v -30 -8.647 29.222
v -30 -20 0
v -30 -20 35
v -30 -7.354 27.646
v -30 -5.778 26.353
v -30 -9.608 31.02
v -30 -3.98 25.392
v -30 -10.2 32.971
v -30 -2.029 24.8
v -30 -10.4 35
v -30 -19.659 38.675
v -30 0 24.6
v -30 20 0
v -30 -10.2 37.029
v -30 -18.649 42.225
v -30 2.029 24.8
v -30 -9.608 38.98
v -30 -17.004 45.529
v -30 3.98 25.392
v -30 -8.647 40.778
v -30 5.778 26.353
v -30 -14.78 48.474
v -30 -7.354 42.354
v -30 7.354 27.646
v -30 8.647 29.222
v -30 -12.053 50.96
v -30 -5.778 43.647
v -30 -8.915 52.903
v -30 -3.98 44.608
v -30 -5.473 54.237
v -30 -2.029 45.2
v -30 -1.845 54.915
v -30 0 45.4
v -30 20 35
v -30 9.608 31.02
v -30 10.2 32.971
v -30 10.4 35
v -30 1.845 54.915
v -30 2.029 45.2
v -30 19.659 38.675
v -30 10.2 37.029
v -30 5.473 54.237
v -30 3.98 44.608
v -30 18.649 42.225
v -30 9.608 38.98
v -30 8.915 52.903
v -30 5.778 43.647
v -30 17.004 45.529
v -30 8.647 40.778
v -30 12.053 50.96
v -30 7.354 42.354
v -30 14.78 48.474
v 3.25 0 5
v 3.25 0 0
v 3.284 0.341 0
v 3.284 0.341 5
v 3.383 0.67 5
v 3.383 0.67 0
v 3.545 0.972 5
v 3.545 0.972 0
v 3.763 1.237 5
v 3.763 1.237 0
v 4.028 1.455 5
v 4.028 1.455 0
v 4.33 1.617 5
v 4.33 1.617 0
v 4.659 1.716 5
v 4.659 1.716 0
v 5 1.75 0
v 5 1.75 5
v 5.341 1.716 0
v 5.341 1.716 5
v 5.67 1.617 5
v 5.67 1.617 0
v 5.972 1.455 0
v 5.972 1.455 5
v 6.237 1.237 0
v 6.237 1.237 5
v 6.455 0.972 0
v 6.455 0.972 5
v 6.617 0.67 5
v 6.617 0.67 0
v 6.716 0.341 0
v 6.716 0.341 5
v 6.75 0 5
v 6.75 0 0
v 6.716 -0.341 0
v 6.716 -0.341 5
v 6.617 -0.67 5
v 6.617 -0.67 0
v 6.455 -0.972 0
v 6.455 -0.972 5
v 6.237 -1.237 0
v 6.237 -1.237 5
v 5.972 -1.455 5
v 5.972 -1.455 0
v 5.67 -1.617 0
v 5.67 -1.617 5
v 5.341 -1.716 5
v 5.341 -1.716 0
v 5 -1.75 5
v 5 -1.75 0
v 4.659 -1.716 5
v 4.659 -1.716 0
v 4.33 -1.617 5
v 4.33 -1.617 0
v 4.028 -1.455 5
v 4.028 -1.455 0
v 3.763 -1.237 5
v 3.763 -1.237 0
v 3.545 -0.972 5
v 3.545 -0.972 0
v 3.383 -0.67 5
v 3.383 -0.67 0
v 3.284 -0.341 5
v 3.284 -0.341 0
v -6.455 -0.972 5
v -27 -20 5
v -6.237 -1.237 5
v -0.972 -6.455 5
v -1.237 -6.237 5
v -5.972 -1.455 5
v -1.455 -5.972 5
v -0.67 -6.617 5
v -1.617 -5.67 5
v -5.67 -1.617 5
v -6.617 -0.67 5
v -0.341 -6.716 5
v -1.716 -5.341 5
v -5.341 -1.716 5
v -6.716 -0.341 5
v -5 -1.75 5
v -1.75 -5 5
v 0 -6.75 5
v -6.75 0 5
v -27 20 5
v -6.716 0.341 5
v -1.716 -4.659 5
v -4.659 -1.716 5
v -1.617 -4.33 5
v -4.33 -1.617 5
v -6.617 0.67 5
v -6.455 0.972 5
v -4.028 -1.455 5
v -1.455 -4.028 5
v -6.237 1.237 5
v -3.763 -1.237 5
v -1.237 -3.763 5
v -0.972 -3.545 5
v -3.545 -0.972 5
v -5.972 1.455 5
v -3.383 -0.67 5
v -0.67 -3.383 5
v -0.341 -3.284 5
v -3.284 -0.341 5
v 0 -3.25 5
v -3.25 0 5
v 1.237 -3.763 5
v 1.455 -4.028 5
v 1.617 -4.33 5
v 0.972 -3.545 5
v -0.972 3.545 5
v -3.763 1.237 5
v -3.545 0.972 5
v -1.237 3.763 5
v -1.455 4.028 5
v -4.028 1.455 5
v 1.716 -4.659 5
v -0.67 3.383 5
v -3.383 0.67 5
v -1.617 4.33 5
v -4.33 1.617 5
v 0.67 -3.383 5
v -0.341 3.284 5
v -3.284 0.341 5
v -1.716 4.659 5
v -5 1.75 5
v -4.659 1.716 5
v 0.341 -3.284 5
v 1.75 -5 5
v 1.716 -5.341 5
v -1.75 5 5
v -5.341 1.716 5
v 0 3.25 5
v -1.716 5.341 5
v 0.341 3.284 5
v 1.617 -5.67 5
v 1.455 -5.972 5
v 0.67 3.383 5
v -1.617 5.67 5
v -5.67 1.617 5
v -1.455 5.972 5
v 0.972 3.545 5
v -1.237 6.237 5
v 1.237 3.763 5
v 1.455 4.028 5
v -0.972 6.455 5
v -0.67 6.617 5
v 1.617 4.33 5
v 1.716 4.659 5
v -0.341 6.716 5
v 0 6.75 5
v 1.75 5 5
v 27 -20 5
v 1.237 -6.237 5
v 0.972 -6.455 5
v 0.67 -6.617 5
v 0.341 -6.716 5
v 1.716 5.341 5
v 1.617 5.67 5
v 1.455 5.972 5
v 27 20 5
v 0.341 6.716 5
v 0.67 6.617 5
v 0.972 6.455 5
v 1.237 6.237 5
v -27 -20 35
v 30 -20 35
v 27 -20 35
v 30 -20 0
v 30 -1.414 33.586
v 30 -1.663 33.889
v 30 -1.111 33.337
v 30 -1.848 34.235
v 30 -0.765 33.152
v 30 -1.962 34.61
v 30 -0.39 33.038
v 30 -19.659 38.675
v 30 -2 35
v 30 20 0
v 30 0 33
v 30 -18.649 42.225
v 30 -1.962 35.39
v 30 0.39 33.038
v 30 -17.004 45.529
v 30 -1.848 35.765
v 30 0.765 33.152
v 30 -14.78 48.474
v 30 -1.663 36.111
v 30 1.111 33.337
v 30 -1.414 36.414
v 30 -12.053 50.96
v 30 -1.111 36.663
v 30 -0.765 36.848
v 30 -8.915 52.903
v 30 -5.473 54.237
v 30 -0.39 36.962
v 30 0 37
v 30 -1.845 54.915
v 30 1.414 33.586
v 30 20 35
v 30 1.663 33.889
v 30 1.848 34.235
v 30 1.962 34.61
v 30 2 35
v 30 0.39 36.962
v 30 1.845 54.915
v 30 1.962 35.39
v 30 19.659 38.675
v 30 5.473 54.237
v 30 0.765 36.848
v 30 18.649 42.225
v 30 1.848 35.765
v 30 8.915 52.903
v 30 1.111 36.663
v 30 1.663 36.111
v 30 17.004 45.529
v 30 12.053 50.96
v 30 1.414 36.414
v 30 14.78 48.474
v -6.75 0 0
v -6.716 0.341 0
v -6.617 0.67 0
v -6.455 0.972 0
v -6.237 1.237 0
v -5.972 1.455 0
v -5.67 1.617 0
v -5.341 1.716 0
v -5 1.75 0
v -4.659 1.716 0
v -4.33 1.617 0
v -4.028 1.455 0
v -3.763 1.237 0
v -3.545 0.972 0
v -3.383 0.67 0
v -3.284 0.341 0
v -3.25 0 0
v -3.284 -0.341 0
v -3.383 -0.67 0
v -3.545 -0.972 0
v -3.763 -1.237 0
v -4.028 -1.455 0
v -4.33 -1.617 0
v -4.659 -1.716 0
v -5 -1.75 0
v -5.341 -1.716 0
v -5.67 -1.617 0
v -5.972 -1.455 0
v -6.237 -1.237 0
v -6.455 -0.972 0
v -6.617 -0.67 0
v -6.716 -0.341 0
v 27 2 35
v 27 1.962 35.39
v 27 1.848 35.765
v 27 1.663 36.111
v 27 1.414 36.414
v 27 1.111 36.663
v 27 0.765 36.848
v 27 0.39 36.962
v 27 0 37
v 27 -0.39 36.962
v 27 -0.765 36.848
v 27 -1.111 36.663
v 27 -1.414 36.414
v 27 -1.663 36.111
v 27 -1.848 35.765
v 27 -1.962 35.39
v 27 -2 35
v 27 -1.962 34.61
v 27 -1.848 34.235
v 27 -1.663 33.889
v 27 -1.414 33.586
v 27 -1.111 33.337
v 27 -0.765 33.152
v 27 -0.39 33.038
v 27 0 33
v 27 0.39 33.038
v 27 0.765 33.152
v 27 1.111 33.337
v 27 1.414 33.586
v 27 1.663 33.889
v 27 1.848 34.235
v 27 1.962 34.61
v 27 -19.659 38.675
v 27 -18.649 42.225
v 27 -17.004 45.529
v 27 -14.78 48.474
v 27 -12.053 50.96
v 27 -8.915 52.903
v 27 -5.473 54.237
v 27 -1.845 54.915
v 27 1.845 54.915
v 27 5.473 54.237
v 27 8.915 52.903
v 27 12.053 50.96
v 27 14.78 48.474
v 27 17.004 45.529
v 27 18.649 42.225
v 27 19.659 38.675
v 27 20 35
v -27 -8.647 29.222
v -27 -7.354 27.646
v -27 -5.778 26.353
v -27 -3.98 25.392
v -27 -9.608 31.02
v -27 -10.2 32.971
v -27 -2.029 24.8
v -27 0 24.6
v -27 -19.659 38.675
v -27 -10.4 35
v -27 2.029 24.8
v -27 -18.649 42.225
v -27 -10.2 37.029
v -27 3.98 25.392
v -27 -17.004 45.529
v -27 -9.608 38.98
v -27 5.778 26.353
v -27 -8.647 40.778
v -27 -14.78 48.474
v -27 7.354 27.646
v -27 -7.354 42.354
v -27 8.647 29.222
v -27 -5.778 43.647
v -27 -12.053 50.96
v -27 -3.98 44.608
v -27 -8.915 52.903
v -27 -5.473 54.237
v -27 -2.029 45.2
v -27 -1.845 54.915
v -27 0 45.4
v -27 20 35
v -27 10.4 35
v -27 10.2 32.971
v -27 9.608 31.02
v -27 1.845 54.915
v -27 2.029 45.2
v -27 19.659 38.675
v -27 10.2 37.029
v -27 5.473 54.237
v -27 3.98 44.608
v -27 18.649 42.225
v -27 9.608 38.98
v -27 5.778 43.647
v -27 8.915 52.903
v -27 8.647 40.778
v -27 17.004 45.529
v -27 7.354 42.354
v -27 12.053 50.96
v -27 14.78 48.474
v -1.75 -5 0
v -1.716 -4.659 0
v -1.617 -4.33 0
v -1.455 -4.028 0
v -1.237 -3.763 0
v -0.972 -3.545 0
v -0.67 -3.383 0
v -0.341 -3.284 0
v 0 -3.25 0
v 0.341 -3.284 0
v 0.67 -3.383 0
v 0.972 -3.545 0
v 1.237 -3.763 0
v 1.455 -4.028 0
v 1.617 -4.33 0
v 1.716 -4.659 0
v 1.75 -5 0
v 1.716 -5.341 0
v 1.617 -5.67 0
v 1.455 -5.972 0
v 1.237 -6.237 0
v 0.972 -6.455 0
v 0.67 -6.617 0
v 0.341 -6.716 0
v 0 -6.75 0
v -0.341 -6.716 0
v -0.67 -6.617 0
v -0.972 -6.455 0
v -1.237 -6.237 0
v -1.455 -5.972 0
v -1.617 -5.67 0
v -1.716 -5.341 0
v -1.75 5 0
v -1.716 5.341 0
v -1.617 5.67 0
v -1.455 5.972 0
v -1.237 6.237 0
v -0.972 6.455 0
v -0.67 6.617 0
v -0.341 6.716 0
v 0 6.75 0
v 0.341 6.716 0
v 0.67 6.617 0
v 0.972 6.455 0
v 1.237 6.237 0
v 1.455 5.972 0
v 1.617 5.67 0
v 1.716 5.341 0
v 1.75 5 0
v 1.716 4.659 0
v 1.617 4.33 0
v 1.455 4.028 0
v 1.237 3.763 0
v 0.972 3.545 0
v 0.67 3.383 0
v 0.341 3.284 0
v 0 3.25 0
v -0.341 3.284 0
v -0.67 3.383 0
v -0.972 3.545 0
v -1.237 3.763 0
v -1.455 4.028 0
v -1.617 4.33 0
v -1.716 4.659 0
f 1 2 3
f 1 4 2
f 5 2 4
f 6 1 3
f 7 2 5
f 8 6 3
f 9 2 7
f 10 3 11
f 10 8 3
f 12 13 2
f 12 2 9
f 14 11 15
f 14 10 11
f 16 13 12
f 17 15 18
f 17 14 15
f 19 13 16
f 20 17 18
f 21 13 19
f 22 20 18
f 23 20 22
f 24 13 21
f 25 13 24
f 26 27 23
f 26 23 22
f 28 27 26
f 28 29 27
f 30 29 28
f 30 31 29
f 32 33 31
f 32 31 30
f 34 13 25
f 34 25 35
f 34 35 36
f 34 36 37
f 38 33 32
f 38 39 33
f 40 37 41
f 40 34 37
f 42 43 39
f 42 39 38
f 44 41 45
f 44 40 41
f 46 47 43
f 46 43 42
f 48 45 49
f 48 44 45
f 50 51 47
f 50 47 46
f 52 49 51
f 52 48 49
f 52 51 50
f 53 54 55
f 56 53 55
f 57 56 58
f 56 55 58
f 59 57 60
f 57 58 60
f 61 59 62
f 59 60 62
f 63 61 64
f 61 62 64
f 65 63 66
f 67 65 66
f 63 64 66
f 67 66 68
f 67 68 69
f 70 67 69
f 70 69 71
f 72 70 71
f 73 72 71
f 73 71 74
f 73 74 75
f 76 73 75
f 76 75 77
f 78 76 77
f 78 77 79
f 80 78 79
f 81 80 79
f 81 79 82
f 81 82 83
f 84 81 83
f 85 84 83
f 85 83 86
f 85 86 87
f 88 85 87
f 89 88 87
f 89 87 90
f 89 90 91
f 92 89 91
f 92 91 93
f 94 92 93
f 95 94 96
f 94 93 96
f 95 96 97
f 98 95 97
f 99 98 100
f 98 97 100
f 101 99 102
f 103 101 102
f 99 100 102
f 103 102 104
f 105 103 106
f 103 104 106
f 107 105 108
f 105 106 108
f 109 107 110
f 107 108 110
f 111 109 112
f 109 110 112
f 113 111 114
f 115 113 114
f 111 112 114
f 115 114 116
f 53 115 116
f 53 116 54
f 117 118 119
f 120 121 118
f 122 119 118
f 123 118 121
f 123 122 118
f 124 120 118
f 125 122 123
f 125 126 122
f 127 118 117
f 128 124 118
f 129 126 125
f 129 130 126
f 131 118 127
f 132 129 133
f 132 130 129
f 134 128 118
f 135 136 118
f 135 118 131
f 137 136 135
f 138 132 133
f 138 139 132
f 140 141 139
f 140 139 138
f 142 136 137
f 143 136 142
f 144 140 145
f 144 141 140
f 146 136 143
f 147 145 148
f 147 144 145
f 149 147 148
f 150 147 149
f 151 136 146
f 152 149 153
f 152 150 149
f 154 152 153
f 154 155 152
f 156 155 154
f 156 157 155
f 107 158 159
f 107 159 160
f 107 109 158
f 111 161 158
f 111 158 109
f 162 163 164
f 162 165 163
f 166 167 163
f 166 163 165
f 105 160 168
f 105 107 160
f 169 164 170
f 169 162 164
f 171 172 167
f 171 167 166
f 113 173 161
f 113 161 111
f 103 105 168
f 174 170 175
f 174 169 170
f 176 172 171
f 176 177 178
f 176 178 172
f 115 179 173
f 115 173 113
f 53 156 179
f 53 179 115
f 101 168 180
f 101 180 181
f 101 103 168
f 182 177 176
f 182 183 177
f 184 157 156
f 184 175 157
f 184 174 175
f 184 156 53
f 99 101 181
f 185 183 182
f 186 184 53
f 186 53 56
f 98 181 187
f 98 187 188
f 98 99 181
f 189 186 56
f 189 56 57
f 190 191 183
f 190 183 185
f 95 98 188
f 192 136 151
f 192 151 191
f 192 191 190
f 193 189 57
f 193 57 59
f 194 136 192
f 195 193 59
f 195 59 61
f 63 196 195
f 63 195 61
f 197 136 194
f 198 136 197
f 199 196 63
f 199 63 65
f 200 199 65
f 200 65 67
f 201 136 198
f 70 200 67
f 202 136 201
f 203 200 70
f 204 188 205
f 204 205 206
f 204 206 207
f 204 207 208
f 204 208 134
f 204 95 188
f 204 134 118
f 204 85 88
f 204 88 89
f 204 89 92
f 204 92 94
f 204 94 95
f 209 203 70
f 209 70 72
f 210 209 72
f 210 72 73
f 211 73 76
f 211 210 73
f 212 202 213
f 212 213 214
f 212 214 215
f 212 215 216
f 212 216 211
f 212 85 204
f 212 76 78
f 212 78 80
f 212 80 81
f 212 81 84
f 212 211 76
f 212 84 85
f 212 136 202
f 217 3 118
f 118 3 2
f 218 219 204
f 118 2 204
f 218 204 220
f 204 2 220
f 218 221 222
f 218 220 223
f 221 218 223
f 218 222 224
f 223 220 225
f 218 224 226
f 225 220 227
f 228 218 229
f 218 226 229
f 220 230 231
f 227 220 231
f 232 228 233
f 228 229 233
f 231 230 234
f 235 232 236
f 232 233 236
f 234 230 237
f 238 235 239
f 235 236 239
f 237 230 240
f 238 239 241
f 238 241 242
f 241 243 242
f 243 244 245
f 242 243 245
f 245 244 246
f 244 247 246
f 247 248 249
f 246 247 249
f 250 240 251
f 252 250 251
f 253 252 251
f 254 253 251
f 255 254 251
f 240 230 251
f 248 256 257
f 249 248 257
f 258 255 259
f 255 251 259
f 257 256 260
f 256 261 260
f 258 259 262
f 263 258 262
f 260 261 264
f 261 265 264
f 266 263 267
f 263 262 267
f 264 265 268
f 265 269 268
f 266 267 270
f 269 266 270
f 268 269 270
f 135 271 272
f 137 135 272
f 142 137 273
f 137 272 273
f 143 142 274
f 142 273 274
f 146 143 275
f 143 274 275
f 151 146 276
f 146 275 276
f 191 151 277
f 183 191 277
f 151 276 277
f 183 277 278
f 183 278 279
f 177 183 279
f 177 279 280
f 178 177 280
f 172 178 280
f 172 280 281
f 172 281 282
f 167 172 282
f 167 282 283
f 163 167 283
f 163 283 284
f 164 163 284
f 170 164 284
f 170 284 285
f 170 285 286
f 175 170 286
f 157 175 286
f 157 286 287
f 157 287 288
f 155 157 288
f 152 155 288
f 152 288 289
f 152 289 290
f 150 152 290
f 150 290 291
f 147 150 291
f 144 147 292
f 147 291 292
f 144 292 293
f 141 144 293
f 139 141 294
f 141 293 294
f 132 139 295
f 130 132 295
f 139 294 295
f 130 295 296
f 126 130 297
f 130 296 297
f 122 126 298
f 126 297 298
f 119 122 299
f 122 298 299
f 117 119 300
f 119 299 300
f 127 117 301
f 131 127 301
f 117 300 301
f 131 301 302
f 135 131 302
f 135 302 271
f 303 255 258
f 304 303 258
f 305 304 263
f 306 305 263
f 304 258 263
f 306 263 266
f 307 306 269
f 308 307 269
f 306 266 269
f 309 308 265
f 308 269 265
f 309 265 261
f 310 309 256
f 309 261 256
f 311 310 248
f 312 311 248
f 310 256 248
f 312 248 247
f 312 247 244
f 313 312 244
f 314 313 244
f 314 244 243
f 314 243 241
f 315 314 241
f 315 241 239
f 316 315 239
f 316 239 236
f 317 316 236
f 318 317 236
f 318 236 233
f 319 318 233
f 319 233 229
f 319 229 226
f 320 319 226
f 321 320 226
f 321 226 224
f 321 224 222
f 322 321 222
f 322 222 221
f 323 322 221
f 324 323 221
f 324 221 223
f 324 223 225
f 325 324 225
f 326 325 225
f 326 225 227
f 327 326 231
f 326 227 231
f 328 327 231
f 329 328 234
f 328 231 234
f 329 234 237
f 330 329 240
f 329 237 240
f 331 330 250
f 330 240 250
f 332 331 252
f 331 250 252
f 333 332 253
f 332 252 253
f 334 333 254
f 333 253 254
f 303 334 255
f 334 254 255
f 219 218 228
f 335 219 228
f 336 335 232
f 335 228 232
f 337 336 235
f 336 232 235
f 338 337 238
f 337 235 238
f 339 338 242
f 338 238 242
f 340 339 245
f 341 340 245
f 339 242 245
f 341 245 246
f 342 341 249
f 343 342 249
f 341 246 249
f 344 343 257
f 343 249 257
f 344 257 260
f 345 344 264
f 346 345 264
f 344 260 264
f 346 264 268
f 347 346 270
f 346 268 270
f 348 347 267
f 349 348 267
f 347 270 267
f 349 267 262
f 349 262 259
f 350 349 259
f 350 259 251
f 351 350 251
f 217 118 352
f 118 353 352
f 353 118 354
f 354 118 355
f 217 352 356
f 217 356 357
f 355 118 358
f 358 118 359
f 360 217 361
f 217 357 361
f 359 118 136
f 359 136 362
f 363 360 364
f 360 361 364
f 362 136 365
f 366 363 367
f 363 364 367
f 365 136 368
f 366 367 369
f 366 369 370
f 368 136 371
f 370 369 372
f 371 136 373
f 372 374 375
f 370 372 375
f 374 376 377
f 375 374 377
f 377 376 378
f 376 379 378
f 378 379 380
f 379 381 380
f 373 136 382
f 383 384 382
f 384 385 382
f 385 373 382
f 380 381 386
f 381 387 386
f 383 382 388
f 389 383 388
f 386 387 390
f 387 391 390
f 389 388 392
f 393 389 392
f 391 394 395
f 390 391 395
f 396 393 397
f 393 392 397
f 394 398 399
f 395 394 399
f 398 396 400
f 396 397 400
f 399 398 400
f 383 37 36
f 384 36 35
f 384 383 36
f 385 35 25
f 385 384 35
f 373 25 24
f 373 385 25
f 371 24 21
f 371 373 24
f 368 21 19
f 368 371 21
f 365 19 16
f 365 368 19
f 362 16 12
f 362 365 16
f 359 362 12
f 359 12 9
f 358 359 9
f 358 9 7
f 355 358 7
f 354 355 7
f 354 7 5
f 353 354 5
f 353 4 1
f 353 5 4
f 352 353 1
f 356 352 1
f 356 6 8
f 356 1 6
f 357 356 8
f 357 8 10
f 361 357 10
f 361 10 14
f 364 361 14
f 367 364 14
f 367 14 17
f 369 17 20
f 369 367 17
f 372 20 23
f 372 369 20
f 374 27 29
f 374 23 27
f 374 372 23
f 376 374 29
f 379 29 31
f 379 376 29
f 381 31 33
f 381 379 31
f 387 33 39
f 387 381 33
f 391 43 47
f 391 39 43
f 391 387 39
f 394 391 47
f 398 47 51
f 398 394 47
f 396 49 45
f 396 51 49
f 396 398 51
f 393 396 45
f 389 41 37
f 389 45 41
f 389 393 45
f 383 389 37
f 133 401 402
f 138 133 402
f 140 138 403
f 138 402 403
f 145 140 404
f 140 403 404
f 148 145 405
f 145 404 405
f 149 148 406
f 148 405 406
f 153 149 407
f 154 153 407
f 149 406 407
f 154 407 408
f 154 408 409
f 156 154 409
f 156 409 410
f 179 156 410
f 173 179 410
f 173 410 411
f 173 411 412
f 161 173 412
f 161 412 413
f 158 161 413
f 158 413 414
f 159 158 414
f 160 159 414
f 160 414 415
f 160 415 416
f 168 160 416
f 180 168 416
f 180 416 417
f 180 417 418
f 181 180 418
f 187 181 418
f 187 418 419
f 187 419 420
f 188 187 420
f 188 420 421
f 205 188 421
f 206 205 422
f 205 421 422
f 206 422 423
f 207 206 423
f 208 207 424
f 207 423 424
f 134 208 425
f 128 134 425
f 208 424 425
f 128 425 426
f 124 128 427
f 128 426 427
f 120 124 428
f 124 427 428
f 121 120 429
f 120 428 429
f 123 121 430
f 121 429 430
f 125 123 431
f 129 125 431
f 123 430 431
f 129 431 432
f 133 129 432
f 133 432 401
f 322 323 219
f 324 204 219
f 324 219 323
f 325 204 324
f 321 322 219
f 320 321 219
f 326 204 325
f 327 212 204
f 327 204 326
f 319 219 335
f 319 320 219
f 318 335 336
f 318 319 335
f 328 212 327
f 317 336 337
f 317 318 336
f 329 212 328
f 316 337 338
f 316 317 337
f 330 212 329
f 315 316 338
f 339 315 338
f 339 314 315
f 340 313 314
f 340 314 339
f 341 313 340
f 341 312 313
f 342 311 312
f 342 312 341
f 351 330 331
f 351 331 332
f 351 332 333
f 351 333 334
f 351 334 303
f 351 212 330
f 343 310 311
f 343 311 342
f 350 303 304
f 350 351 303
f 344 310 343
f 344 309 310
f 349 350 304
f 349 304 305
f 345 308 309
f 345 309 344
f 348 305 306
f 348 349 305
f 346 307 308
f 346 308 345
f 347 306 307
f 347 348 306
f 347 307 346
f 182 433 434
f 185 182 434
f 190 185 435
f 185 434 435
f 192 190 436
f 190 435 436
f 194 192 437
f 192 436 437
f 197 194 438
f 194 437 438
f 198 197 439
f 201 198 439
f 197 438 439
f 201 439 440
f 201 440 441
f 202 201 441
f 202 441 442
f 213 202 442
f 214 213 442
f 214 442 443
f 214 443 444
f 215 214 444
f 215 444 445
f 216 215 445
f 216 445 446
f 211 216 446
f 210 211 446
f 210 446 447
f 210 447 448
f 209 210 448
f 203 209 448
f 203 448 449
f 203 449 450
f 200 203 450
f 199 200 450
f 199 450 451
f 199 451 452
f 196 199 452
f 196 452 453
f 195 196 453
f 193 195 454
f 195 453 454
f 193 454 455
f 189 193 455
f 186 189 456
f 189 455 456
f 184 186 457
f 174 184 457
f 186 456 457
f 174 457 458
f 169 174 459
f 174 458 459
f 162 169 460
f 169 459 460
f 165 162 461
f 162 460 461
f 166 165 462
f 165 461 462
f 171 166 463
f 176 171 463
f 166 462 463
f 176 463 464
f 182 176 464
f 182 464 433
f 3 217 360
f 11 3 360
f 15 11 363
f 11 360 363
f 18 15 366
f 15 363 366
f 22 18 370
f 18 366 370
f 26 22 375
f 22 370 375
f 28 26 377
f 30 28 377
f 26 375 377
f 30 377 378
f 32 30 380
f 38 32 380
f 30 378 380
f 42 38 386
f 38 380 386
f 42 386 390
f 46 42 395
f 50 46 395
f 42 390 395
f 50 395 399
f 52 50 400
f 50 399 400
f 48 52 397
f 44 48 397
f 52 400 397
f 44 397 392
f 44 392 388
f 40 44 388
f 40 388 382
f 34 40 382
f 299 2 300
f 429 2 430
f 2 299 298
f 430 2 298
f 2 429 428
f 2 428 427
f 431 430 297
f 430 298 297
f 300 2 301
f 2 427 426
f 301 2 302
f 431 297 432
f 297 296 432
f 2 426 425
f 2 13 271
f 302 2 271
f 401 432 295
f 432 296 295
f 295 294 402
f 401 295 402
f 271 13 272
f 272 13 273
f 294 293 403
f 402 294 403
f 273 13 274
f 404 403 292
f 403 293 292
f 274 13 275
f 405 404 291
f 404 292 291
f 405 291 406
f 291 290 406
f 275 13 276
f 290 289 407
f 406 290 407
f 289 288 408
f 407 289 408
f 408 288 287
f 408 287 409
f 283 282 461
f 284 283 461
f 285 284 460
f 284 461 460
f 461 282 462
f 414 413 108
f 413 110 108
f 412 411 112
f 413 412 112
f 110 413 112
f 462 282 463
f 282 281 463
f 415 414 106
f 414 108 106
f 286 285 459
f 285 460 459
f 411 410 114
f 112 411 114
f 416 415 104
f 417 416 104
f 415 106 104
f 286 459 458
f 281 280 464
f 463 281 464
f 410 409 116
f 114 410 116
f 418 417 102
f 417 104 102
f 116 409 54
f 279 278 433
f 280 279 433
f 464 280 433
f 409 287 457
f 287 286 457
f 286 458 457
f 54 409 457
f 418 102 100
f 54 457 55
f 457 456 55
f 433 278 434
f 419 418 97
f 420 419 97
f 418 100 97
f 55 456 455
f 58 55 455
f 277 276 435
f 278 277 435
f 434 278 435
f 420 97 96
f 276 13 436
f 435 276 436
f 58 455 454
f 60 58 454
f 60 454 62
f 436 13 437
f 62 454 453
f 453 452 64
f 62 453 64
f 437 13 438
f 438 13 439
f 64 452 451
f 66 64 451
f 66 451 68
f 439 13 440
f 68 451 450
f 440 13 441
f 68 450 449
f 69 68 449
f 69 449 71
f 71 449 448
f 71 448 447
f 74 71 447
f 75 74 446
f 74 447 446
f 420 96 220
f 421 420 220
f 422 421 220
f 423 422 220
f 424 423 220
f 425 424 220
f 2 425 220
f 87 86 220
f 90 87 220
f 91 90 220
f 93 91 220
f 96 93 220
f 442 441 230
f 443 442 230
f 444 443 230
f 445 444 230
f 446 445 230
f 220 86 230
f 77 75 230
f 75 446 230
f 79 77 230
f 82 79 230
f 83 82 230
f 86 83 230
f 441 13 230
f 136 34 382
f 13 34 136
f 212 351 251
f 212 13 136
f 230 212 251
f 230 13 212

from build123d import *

# Parameters (mm, degrees)
SKETCH1_W               = 60
SKETCH1_H               = 40
BOSS_EXTRUDE1_DEPTH     = 5
SKETCH3_W               = 3
SKETCH3_H               = 40
BOSS_EXTRUDE2_DEPTH     = 30
BOSS_EXTRUDE3_DEPTH     = 3
BOSS_EXTRUDE4_START     = -3
BOSS_EXTRUDE4_DEPTH     = 3
SKETCH8_R               = 1.75
CUT_EXTRUDE1_DEPTH      = 66.76473219
CUT_EXTRUDE2_DEPTH      = 84.815273071
CUT_EXTRUDE2_DEPTH_BACK = 3
SKETCH11_R              = 10.4
SKETCH13_R              = 2
CUT_EXTRUDE3_DEPTH      = 10


with BuildPart() as part:
    # Sketch1 → Boss-Extrude1 (new body)
    with BuildSketch(Plane.XY):
        Rectangle(SKETCH1_W, SKETCH1_H)
    extrude(amount=BOSS_EXTRUDE1_DEPTH)

    # Sketch3 → Boss-Extrude2 (add)
    with BuildSketch(Plane.XY.offset(5)):
        with Locations((-28.5, 0)):
            Rectangle(SKETCH3_W, SKETCH3_H)
        with Locations((28.5, 0)):
            Rectangle(SKETCH3_W, SKETCH3_H)
    extrude(amount=BOSS_EXTRUDE2_DEPTH)

    # Sketch9 → Boss-Extrude3 (add)
    with BuildSketch(Plane(origin=(30, 0, 0), x_dir=(0, 0, -1), z_dir=(1, 0, 0))):
        with BuildLine():
            Line((-35, 20), (-35, -20))
            ThreePointArc((-35, -20), (-55, 0), (-35, 20))
        make_face()
    extrude(amount=-BOSS_EXTRUDE3_DEPTH)

    # Sketch10 → Boss-Extrude4 (add)
    with BuildSketch(Plane.ZY.offset(30).offset(BOSS_EXTRUDE4_START)):
        with BuildLine():
            Line((35, 20), (35, -20))
            ThreePointArc((35, -20), (55, 0), (35, 20))
        make_face()
    extrude(amount=BOSS_EXTRUDE4_DEPTH)

    # Sketch8 → Cut-Extrude1 (cut, through all)
    with BuildSketch(Plane(origin=(0, 0, 0), x_dir=(-1, 0, 0), z_dir=(0, 0, -1))):
        with Locations((-5, 0)):
            Circle(SKETCH8_R)
        with Locations((0, 5)):
            Circle(SKETCH8_R)
        with Locations((0, -5)):
            Circle(SKETCH8_R)
        with Locations((5, 0)):
            Circle(SKETCH8_R)
    extrude(amount=-CUT_EXTRUDE1_DEPTH, mode=Mode.SUBTRACT)

    # Sketch11 → Cut-Extrude2 (cut, two sides: drawn at the far end of the back side and taken through both)
    with BuildSketch(Plane.ZY.offset(30).offset(-CUT_EXTRUDE2_DEPTH_BACK)):
        with Locations(Location((35, 0, 0), (0, 0, 90))):
            Circle(SKETCH11_R)
    extrude(amount=CUT_EXTRUDE2_DEPTH + CUT_EXTRUDE2_DEPTH_BACK, mode=Mode.SUBTRACT)

    # Sketch13 → Cut-Extrude3 (cut)
    with BuildSketch(Plane(origin=(30, 0, 0), x_dir=(0, 0, -1), z_dir=(1, 0, 0))):
        with Locations(Location((-35, 0, 0), (0, 0, 90))):
            Circle(SKETCH13_R)
    extrude(amount=-CUT_EXTRUDE3_DEPTH, mode=Mode.SUBTRACT)


solid = part.part
